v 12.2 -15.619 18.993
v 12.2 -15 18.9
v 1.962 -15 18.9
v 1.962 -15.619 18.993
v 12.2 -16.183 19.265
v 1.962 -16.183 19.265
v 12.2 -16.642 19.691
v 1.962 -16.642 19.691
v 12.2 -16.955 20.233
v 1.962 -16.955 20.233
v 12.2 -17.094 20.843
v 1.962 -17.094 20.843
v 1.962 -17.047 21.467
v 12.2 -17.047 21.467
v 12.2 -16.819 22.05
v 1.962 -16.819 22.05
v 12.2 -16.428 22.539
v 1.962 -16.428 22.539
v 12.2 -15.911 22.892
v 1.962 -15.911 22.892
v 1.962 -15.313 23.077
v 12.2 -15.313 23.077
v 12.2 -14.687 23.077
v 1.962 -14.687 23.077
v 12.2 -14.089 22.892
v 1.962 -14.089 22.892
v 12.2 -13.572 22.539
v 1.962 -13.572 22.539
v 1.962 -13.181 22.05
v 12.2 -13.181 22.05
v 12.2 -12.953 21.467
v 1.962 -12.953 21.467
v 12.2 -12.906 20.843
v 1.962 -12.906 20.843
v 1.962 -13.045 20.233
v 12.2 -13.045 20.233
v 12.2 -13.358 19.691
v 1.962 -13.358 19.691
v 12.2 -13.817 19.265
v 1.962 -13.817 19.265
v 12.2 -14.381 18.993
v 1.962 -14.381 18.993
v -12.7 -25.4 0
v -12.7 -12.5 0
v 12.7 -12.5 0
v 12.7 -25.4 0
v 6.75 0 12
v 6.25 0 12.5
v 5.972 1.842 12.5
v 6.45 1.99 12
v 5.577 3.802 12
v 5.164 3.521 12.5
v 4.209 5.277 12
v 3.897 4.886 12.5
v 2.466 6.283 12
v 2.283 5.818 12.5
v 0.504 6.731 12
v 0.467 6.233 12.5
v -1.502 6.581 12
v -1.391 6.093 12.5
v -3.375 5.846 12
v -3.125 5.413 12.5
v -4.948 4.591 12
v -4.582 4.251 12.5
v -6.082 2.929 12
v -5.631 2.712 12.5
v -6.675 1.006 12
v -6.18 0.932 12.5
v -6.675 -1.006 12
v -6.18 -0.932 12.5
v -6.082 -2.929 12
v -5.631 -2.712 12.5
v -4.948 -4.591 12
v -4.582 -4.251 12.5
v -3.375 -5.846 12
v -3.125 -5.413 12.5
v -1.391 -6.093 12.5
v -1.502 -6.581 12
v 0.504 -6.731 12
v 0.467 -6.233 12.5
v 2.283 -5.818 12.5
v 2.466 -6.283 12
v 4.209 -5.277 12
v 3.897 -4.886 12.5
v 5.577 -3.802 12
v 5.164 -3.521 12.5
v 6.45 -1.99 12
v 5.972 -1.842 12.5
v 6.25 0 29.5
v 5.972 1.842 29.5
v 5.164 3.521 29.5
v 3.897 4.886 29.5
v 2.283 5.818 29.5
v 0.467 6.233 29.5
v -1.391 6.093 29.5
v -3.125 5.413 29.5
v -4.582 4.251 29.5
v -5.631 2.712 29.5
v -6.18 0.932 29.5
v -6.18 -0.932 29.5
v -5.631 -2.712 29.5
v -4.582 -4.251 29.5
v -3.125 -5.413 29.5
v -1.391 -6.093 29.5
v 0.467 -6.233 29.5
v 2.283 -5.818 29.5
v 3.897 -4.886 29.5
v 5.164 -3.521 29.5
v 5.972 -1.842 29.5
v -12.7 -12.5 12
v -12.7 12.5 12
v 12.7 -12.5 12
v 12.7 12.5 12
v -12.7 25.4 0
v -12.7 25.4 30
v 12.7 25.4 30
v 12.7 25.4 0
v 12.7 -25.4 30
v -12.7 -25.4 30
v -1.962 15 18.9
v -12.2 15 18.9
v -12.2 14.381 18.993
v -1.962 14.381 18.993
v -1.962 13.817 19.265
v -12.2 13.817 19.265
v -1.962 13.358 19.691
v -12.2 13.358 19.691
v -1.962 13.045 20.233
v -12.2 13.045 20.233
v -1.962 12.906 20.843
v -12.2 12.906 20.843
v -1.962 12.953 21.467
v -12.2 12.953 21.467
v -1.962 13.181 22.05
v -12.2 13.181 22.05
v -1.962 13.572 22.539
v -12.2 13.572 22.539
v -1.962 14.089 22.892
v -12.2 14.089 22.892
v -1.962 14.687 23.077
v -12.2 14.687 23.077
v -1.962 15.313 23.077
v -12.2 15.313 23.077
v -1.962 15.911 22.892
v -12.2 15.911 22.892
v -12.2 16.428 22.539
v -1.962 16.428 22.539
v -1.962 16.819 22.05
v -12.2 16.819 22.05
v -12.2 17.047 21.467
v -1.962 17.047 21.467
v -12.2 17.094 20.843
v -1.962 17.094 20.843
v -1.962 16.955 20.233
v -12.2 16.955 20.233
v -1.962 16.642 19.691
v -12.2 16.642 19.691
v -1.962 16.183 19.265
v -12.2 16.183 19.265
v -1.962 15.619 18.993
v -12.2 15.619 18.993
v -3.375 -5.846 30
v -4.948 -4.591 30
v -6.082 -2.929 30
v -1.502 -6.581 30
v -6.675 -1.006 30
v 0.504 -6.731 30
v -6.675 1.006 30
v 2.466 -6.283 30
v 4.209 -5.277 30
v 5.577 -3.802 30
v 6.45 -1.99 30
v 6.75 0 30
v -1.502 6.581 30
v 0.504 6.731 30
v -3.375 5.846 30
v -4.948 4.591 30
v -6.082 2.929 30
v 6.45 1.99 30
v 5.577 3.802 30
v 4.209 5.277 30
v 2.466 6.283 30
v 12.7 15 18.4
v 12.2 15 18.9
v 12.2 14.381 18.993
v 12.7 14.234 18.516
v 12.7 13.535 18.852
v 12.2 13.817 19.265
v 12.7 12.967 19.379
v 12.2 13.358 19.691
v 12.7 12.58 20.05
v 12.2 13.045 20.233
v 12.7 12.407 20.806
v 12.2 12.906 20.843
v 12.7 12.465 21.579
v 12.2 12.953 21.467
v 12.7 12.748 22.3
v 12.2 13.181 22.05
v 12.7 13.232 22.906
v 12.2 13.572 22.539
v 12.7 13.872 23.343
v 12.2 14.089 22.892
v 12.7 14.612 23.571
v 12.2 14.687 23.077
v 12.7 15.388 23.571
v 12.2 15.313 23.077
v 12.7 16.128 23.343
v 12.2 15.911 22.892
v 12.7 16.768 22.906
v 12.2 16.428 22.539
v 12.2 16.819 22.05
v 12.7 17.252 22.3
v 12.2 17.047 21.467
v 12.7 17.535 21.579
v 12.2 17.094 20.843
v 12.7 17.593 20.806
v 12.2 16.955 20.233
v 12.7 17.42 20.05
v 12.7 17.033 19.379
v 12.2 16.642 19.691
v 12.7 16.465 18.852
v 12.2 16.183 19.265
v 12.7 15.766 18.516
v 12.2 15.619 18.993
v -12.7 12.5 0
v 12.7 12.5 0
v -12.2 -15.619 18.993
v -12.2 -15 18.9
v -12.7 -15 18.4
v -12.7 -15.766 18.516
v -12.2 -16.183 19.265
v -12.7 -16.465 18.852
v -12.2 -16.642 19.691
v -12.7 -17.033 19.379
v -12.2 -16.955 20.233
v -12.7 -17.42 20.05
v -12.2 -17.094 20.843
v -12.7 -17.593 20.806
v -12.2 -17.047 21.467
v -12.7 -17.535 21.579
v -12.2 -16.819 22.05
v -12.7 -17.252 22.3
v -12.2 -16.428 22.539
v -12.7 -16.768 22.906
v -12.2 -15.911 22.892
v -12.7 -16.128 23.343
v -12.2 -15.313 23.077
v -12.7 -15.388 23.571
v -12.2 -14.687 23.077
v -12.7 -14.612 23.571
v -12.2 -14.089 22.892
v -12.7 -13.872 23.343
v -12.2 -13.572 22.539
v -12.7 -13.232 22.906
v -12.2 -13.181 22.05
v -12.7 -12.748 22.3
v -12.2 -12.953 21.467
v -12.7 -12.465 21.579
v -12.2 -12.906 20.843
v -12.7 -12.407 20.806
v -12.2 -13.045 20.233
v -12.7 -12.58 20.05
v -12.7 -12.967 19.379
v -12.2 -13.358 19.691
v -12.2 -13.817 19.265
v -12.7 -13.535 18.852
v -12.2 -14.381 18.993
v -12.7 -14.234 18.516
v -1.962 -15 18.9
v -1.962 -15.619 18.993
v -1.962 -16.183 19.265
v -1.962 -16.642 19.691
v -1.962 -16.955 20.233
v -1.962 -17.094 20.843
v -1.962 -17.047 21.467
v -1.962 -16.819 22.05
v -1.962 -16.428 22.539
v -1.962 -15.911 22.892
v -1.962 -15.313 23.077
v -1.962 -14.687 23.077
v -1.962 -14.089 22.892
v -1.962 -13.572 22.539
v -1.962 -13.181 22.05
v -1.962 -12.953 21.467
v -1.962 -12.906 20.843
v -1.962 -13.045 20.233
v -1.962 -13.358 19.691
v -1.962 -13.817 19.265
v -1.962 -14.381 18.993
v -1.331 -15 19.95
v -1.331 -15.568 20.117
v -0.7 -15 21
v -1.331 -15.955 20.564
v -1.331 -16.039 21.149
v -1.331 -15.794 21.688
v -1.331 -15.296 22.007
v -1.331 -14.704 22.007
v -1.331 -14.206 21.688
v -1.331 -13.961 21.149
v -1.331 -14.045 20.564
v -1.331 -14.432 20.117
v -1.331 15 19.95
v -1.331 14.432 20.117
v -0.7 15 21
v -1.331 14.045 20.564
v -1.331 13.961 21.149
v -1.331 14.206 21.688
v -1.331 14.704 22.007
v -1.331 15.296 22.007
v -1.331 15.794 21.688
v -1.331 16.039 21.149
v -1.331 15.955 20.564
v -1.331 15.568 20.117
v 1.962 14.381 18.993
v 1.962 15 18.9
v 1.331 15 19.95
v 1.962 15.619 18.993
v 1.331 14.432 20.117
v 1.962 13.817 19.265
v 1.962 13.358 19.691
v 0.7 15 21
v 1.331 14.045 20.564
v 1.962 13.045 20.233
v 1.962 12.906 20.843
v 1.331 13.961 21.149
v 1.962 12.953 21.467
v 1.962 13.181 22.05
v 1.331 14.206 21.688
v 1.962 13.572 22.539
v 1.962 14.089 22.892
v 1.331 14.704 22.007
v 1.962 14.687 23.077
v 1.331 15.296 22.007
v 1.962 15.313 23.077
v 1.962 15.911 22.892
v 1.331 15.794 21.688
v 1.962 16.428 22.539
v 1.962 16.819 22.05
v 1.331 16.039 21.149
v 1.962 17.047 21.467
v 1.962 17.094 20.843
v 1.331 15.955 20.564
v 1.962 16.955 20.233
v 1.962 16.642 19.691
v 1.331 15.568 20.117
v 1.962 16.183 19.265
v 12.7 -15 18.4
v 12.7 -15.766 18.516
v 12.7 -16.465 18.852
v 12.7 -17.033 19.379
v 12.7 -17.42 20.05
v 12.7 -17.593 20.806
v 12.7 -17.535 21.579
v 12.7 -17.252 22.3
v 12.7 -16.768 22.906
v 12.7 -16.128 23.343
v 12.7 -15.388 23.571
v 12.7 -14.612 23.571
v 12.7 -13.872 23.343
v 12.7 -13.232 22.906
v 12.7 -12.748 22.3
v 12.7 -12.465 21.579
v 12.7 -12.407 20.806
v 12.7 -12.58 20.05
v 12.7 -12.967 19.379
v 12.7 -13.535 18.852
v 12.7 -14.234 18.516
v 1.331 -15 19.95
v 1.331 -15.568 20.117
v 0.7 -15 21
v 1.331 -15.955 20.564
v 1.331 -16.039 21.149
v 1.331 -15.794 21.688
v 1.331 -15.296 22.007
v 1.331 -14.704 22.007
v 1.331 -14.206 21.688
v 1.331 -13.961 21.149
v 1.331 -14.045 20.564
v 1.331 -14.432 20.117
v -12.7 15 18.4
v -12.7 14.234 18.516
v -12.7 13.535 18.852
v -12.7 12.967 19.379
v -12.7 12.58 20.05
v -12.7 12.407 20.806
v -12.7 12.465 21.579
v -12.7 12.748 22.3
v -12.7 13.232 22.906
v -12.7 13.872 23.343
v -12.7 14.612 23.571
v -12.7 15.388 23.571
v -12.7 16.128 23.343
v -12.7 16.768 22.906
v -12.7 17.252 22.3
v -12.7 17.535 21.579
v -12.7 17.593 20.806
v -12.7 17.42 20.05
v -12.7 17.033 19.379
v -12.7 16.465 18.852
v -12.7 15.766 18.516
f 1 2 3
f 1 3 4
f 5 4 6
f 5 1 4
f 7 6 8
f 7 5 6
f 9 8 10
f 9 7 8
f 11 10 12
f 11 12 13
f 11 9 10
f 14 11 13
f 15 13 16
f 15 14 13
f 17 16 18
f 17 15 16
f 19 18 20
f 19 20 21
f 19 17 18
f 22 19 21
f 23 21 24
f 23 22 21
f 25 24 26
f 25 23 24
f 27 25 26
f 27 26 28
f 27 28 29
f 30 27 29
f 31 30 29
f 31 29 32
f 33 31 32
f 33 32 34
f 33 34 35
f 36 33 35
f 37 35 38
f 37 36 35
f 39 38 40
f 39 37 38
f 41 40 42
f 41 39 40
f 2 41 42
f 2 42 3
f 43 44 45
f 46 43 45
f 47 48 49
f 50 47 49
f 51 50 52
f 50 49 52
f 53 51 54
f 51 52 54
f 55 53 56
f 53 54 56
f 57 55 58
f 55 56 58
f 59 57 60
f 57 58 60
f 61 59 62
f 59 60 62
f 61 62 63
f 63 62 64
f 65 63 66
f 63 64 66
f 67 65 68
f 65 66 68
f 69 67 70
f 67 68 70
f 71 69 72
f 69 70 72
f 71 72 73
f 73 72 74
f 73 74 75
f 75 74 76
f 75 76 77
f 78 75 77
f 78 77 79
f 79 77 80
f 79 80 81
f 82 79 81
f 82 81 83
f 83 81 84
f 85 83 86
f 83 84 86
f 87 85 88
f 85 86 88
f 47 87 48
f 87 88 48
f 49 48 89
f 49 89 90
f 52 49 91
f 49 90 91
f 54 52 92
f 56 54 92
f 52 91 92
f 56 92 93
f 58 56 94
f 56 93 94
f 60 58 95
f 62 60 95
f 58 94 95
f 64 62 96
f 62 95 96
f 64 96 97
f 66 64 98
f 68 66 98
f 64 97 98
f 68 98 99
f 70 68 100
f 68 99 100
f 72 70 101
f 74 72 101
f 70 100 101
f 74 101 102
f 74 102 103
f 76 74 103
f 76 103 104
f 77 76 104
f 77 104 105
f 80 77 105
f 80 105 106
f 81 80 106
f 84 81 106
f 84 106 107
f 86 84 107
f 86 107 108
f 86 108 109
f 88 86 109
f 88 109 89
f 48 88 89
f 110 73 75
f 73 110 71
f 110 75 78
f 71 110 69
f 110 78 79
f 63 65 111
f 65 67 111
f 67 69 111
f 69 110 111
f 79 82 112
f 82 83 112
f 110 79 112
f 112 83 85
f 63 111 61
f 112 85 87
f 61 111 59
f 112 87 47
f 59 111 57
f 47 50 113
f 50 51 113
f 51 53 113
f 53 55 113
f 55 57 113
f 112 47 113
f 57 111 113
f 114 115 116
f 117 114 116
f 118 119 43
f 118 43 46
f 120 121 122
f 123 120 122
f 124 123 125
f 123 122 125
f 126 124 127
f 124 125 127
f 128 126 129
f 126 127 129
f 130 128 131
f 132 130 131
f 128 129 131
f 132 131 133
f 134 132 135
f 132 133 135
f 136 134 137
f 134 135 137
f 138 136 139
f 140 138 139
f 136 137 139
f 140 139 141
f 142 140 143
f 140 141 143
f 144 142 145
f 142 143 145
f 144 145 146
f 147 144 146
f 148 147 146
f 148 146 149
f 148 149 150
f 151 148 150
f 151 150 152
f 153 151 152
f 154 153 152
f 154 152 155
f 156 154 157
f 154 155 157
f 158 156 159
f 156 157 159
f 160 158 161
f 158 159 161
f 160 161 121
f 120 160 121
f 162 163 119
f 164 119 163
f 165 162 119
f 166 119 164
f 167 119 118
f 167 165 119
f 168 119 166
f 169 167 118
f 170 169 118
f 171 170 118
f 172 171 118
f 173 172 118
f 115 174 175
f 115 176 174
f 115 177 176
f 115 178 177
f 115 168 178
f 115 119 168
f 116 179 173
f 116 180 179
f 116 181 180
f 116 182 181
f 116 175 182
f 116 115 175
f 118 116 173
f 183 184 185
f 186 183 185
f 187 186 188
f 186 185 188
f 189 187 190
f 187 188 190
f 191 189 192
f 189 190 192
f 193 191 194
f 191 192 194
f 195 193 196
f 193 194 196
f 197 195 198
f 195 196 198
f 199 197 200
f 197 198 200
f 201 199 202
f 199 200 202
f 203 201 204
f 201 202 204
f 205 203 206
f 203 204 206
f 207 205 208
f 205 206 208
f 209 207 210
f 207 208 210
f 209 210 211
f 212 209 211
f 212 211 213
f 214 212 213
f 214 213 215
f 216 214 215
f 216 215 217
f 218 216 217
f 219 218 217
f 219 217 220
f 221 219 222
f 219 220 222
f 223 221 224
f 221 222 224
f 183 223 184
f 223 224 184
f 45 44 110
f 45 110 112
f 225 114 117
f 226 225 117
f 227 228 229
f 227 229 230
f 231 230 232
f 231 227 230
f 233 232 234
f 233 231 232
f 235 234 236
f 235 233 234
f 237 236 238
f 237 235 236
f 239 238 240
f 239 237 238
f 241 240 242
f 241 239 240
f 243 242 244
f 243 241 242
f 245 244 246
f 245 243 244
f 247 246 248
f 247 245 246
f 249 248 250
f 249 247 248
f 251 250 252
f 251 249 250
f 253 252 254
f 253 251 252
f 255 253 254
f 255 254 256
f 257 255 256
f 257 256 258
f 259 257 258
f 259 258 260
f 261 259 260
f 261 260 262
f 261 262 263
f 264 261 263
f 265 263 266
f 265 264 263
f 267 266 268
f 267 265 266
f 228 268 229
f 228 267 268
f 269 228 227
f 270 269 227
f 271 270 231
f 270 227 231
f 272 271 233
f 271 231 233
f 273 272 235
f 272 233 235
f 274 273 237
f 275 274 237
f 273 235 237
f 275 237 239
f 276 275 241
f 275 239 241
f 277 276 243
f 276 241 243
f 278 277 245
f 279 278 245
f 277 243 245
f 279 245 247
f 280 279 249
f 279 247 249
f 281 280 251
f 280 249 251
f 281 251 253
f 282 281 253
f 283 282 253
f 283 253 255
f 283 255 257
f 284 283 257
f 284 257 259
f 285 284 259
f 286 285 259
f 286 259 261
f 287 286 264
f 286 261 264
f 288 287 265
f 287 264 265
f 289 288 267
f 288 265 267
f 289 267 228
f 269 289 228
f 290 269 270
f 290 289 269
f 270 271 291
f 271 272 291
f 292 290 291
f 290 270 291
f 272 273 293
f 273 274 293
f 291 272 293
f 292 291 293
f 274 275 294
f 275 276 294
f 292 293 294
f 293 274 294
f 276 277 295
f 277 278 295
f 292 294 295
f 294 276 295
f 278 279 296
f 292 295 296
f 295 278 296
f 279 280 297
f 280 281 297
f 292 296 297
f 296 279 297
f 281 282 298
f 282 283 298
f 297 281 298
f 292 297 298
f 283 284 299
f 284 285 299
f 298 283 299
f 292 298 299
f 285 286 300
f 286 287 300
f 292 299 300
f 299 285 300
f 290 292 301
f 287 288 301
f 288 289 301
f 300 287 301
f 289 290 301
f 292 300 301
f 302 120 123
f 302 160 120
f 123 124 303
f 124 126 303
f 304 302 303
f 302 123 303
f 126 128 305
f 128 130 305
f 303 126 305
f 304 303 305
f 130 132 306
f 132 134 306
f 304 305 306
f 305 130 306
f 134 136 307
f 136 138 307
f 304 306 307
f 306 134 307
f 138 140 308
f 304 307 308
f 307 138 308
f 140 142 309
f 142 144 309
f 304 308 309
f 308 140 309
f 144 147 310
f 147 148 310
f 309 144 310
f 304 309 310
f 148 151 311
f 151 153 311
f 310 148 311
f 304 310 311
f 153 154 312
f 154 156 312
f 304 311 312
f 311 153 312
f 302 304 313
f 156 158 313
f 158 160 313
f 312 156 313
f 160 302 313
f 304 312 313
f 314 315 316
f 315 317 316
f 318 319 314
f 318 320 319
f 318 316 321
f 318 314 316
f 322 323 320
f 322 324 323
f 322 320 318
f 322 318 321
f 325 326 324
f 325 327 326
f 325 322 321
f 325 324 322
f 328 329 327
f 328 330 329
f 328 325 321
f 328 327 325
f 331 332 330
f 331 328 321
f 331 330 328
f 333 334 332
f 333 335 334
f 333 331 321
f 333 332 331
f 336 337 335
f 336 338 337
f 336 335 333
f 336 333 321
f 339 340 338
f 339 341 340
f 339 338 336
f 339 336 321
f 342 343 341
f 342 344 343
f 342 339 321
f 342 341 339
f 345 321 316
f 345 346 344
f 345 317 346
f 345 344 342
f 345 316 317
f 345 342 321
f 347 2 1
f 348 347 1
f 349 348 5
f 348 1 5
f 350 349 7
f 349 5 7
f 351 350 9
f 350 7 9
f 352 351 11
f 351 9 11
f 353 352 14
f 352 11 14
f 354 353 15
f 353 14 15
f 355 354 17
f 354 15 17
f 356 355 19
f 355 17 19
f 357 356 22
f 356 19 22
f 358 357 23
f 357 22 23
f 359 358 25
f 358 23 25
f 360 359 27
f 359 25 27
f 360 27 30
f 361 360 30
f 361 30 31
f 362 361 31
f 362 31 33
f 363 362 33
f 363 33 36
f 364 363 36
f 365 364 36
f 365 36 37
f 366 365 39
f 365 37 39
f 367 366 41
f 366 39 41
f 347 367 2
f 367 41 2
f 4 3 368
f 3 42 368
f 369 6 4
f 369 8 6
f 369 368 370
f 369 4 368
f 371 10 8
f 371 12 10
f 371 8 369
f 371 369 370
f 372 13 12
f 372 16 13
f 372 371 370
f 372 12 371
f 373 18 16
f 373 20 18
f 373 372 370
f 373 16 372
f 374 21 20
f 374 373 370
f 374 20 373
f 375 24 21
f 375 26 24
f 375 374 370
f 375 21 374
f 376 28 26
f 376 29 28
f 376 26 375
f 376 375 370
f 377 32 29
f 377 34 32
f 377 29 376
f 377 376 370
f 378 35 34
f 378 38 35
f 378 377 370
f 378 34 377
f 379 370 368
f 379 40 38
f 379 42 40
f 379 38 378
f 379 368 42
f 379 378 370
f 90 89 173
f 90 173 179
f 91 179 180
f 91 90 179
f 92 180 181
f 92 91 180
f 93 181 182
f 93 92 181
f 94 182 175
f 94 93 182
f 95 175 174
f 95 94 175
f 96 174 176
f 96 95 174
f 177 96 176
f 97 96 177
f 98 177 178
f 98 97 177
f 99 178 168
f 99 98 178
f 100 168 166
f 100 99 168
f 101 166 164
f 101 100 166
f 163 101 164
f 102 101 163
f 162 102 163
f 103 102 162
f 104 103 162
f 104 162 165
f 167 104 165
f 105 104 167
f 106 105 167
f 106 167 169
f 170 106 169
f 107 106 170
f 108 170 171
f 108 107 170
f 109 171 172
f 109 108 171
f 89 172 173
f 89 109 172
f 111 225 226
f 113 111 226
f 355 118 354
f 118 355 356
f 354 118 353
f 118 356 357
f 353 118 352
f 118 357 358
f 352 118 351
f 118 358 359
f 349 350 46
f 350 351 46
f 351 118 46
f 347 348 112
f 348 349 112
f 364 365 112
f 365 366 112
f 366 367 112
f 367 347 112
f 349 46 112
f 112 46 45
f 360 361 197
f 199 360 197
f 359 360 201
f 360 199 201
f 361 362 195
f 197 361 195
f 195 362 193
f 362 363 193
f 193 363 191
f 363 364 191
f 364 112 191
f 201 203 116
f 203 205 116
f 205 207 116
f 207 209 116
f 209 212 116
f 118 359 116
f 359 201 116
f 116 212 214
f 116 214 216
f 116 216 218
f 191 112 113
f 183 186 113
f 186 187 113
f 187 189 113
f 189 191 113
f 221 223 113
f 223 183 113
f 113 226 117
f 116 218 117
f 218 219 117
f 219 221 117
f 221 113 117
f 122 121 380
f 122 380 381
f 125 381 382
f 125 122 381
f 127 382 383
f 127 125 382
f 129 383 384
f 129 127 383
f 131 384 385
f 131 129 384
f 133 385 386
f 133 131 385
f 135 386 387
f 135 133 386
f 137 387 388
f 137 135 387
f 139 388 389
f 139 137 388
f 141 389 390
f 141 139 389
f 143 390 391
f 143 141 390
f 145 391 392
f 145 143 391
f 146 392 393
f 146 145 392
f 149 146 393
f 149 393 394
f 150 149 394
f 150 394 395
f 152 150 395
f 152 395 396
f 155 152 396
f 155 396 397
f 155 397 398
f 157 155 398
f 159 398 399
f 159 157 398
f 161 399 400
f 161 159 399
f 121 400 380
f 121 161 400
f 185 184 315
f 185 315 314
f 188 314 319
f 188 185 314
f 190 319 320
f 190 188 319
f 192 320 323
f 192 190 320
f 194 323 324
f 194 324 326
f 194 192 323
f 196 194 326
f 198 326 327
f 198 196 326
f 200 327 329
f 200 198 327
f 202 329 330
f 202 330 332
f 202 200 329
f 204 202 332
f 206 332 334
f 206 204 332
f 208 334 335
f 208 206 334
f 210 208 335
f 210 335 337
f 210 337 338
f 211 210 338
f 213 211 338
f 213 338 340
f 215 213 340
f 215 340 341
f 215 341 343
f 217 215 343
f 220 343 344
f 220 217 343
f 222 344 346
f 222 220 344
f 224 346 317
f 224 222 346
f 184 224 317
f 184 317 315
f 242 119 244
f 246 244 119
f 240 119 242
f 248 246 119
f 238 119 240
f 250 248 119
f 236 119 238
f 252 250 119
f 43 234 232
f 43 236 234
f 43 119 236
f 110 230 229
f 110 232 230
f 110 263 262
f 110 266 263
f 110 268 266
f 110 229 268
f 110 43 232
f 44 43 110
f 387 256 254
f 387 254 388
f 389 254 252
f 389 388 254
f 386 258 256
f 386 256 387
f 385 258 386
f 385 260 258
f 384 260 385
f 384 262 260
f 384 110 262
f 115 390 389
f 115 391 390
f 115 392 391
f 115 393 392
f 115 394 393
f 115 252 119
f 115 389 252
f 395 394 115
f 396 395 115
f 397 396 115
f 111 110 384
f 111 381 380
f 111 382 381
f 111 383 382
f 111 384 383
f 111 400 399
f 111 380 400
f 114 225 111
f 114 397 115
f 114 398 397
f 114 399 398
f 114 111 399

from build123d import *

# Parameters (mm, degrees)
SKETCH1_W                      = 25.4
SKETCH1_H                      = 50.8
BOSS_EXTRUDE1_DEPTH            = 30
SKETCH2_W                      = 25.4
SKETCH2_H                      = 25
CUT_EXTRUDE1_DEPTH             = 12
M12_CLEARANCE_HOLE1_D          = 12.5
M5X0_8_TAPPED_HOLE1_AT_2_COUNT = 2
M5X0_8_TAPPED_HOLE1_AT_2_PITCH = 30
CHAMFER1_0_5_MM_SIZE           = 0.5


with BuildPart() as part:
    # Sketch1 → Boss-Extrude1 (new body)
    with BuildSketch(Plane.XY):
        Rectangle(SKETCH1_W, SKETCH1_H)
    extrude(amount=BOSS_EXTRUDE1_DEPTH)

    # Sketch2 → Cut-Extrude1 (cut)
    with BuildSketch(Plane.XY):
        Rectangle(SKETCH2_W, SKETCH2_H)
    extrude(amount=CUT_EXTRUDE1_DEPTH, mode=Mode.SUBTRACT)

    # M12 Clearance Hole1 (through all)
    with Locations(Plane(origin=(0, 0, 12), x_dir=(-1, 0, 0), z_dir=(0, 0, -1))):
        with Locations((0, 0)):
            Hole(M12_CLEARANCE_HOLE1_D / 2)

    # Sketch11 → M5x0.8 Tapped Hole1 (revolve, cut)
    with BuildSketch(Plane(origin=(12.7, 15, 21), x_dir=(0, 0, -1), z_dir=(0, 1, 0))):
        Polygon((0, 0), (0, 12), (2.1, 10.7381927), (2.1, 0), align=None)
    m5x0_8_tapped_hole1 = revolve(axis=Axis((19.05, 15, 21), (-1, 0, 0)), mode=Mode.SUBTRACT)

    # M5x0.8 Tapped Hole1 at 2: M5x0.8 Tapped Hole1 ×2
    with Locations(*[(0, -i * M5X0_8_TAPPED_HOLE1_AT_2_PITCH, 0) for i in range(1, M5X0_8_TAPPED_HOLE1_AT_2_COUNT)]):
        add(m5x0_8_tapped_hole1, mode=Mode.SUBTRACT)

    # Mirror1: M5x0.8 Tapped Hole1 across plane
    add(m5x0_8_tapped_hole1.mirror(Plane(origin=(0, 0, 0), x_dir=(0, 0, 1), z_dir=(1, 0, 0))), mode=Mode.SUBTRACT)

    # Mirror1 copy 1 sketch → Mirror1 copy 1 (revolve, cut)
    with BuildSketch(Plane(origin=(-12.7, -15, 21), x_dir=(0, 0, -1), z_dir=(0, 1, 0))):
        Polygon((0, 0), (0, -12), (2.1, -10.7381927), (2.1, 0), align=None)
    revolve(axis=Axis((-19.05, -15, 21), (-1, 0, 0)), mode=Mode.SUBTRACT)

    # Chamfer1 0.5 mm
    chamfer1_0_5_mm_edges = [part.edges().sort_by_distance(p)[0] for p in [
        (-6.25, 0, 12),
        (-6.25, 0, 30),
        (12.7, -15, 23.1),
        (12.7, 15, 23.1),
        (-12.7, -15, 23.1),
        (-12.7, 15, 23.1),
    ]]
    chamfer(chamfer1_0_5_mm_edges, length=CHAMFER1_0_5_MM_SIZE)


solid = part.part
